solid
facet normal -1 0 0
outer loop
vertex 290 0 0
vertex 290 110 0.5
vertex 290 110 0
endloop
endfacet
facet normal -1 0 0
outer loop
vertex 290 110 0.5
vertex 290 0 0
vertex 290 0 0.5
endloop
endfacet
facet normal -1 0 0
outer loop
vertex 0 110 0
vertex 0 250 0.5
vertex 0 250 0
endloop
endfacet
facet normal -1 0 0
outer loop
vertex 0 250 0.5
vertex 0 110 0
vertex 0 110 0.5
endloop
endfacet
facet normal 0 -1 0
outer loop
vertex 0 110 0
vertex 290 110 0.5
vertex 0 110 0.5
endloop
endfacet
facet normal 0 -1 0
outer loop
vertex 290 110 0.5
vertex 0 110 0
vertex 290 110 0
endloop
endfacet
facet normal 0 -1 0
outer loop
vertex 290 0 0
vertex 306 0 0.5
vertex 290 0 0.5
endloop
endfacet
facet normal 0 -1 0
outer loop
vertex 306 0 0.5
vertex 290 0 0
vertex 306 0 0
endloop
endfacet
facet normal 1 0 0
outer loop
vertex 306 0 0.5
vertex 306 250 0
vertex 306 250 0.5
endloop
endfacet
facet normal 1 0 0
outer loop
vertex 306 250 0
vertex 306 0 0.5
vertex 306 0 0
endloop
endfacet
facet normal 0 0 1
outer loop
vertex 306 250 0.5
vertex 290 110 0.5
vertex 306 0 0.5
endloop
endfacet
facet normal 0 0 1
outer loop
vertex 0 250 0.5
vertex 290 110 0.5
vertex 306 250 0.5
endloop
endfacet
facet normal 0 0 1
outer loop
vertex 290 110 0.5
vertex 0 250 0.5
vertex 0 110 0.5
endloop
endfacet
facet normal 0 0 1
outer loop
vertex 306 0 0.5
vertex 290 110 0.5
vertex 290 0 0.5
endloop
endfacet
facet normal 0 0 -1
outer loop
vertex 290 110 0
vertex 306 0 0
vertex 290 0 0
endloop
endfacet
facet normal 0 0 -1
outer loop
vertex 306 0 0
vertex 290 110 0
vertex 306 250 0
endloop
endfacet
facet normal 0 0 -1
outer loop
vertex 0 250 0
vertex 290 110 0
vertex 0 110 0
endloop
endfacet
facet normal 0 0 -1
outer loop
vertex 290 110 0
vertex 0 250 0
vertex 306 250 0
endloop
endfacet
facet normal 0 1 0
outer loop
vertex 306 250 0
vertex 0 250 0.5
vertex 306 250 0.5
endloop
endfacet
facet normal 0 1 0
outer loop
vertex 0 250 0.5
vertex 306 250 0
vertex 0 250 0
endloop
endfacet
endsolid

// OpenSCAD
hole_depth = 1.5;
base_plate_width = 306;
base_plate_depth = 250;
base_plate_fudge_x = 0;
base_plate_fudge_y = 0;

module keyboard_holes() {
    // lots of fudge factor in here to try and turn the 'keyboard' into 'keyboard holes'
    difference() {
        translate([0, 0, -(hole_depth / 2)]) {
            cube([290, 110, hole_depth]);
        }
        translate([-20, -20, 0]) {
            linear_extrude(height = 1.6, center = true, convexity = 5)
                import(file = "coco-keyboard-plate-with-20mm-padding.dxf");
        }
    }
}

difference() {
    cube([base_plate_width, base_plate_depth, 0.5]); 
    keyboard_holes();
}
